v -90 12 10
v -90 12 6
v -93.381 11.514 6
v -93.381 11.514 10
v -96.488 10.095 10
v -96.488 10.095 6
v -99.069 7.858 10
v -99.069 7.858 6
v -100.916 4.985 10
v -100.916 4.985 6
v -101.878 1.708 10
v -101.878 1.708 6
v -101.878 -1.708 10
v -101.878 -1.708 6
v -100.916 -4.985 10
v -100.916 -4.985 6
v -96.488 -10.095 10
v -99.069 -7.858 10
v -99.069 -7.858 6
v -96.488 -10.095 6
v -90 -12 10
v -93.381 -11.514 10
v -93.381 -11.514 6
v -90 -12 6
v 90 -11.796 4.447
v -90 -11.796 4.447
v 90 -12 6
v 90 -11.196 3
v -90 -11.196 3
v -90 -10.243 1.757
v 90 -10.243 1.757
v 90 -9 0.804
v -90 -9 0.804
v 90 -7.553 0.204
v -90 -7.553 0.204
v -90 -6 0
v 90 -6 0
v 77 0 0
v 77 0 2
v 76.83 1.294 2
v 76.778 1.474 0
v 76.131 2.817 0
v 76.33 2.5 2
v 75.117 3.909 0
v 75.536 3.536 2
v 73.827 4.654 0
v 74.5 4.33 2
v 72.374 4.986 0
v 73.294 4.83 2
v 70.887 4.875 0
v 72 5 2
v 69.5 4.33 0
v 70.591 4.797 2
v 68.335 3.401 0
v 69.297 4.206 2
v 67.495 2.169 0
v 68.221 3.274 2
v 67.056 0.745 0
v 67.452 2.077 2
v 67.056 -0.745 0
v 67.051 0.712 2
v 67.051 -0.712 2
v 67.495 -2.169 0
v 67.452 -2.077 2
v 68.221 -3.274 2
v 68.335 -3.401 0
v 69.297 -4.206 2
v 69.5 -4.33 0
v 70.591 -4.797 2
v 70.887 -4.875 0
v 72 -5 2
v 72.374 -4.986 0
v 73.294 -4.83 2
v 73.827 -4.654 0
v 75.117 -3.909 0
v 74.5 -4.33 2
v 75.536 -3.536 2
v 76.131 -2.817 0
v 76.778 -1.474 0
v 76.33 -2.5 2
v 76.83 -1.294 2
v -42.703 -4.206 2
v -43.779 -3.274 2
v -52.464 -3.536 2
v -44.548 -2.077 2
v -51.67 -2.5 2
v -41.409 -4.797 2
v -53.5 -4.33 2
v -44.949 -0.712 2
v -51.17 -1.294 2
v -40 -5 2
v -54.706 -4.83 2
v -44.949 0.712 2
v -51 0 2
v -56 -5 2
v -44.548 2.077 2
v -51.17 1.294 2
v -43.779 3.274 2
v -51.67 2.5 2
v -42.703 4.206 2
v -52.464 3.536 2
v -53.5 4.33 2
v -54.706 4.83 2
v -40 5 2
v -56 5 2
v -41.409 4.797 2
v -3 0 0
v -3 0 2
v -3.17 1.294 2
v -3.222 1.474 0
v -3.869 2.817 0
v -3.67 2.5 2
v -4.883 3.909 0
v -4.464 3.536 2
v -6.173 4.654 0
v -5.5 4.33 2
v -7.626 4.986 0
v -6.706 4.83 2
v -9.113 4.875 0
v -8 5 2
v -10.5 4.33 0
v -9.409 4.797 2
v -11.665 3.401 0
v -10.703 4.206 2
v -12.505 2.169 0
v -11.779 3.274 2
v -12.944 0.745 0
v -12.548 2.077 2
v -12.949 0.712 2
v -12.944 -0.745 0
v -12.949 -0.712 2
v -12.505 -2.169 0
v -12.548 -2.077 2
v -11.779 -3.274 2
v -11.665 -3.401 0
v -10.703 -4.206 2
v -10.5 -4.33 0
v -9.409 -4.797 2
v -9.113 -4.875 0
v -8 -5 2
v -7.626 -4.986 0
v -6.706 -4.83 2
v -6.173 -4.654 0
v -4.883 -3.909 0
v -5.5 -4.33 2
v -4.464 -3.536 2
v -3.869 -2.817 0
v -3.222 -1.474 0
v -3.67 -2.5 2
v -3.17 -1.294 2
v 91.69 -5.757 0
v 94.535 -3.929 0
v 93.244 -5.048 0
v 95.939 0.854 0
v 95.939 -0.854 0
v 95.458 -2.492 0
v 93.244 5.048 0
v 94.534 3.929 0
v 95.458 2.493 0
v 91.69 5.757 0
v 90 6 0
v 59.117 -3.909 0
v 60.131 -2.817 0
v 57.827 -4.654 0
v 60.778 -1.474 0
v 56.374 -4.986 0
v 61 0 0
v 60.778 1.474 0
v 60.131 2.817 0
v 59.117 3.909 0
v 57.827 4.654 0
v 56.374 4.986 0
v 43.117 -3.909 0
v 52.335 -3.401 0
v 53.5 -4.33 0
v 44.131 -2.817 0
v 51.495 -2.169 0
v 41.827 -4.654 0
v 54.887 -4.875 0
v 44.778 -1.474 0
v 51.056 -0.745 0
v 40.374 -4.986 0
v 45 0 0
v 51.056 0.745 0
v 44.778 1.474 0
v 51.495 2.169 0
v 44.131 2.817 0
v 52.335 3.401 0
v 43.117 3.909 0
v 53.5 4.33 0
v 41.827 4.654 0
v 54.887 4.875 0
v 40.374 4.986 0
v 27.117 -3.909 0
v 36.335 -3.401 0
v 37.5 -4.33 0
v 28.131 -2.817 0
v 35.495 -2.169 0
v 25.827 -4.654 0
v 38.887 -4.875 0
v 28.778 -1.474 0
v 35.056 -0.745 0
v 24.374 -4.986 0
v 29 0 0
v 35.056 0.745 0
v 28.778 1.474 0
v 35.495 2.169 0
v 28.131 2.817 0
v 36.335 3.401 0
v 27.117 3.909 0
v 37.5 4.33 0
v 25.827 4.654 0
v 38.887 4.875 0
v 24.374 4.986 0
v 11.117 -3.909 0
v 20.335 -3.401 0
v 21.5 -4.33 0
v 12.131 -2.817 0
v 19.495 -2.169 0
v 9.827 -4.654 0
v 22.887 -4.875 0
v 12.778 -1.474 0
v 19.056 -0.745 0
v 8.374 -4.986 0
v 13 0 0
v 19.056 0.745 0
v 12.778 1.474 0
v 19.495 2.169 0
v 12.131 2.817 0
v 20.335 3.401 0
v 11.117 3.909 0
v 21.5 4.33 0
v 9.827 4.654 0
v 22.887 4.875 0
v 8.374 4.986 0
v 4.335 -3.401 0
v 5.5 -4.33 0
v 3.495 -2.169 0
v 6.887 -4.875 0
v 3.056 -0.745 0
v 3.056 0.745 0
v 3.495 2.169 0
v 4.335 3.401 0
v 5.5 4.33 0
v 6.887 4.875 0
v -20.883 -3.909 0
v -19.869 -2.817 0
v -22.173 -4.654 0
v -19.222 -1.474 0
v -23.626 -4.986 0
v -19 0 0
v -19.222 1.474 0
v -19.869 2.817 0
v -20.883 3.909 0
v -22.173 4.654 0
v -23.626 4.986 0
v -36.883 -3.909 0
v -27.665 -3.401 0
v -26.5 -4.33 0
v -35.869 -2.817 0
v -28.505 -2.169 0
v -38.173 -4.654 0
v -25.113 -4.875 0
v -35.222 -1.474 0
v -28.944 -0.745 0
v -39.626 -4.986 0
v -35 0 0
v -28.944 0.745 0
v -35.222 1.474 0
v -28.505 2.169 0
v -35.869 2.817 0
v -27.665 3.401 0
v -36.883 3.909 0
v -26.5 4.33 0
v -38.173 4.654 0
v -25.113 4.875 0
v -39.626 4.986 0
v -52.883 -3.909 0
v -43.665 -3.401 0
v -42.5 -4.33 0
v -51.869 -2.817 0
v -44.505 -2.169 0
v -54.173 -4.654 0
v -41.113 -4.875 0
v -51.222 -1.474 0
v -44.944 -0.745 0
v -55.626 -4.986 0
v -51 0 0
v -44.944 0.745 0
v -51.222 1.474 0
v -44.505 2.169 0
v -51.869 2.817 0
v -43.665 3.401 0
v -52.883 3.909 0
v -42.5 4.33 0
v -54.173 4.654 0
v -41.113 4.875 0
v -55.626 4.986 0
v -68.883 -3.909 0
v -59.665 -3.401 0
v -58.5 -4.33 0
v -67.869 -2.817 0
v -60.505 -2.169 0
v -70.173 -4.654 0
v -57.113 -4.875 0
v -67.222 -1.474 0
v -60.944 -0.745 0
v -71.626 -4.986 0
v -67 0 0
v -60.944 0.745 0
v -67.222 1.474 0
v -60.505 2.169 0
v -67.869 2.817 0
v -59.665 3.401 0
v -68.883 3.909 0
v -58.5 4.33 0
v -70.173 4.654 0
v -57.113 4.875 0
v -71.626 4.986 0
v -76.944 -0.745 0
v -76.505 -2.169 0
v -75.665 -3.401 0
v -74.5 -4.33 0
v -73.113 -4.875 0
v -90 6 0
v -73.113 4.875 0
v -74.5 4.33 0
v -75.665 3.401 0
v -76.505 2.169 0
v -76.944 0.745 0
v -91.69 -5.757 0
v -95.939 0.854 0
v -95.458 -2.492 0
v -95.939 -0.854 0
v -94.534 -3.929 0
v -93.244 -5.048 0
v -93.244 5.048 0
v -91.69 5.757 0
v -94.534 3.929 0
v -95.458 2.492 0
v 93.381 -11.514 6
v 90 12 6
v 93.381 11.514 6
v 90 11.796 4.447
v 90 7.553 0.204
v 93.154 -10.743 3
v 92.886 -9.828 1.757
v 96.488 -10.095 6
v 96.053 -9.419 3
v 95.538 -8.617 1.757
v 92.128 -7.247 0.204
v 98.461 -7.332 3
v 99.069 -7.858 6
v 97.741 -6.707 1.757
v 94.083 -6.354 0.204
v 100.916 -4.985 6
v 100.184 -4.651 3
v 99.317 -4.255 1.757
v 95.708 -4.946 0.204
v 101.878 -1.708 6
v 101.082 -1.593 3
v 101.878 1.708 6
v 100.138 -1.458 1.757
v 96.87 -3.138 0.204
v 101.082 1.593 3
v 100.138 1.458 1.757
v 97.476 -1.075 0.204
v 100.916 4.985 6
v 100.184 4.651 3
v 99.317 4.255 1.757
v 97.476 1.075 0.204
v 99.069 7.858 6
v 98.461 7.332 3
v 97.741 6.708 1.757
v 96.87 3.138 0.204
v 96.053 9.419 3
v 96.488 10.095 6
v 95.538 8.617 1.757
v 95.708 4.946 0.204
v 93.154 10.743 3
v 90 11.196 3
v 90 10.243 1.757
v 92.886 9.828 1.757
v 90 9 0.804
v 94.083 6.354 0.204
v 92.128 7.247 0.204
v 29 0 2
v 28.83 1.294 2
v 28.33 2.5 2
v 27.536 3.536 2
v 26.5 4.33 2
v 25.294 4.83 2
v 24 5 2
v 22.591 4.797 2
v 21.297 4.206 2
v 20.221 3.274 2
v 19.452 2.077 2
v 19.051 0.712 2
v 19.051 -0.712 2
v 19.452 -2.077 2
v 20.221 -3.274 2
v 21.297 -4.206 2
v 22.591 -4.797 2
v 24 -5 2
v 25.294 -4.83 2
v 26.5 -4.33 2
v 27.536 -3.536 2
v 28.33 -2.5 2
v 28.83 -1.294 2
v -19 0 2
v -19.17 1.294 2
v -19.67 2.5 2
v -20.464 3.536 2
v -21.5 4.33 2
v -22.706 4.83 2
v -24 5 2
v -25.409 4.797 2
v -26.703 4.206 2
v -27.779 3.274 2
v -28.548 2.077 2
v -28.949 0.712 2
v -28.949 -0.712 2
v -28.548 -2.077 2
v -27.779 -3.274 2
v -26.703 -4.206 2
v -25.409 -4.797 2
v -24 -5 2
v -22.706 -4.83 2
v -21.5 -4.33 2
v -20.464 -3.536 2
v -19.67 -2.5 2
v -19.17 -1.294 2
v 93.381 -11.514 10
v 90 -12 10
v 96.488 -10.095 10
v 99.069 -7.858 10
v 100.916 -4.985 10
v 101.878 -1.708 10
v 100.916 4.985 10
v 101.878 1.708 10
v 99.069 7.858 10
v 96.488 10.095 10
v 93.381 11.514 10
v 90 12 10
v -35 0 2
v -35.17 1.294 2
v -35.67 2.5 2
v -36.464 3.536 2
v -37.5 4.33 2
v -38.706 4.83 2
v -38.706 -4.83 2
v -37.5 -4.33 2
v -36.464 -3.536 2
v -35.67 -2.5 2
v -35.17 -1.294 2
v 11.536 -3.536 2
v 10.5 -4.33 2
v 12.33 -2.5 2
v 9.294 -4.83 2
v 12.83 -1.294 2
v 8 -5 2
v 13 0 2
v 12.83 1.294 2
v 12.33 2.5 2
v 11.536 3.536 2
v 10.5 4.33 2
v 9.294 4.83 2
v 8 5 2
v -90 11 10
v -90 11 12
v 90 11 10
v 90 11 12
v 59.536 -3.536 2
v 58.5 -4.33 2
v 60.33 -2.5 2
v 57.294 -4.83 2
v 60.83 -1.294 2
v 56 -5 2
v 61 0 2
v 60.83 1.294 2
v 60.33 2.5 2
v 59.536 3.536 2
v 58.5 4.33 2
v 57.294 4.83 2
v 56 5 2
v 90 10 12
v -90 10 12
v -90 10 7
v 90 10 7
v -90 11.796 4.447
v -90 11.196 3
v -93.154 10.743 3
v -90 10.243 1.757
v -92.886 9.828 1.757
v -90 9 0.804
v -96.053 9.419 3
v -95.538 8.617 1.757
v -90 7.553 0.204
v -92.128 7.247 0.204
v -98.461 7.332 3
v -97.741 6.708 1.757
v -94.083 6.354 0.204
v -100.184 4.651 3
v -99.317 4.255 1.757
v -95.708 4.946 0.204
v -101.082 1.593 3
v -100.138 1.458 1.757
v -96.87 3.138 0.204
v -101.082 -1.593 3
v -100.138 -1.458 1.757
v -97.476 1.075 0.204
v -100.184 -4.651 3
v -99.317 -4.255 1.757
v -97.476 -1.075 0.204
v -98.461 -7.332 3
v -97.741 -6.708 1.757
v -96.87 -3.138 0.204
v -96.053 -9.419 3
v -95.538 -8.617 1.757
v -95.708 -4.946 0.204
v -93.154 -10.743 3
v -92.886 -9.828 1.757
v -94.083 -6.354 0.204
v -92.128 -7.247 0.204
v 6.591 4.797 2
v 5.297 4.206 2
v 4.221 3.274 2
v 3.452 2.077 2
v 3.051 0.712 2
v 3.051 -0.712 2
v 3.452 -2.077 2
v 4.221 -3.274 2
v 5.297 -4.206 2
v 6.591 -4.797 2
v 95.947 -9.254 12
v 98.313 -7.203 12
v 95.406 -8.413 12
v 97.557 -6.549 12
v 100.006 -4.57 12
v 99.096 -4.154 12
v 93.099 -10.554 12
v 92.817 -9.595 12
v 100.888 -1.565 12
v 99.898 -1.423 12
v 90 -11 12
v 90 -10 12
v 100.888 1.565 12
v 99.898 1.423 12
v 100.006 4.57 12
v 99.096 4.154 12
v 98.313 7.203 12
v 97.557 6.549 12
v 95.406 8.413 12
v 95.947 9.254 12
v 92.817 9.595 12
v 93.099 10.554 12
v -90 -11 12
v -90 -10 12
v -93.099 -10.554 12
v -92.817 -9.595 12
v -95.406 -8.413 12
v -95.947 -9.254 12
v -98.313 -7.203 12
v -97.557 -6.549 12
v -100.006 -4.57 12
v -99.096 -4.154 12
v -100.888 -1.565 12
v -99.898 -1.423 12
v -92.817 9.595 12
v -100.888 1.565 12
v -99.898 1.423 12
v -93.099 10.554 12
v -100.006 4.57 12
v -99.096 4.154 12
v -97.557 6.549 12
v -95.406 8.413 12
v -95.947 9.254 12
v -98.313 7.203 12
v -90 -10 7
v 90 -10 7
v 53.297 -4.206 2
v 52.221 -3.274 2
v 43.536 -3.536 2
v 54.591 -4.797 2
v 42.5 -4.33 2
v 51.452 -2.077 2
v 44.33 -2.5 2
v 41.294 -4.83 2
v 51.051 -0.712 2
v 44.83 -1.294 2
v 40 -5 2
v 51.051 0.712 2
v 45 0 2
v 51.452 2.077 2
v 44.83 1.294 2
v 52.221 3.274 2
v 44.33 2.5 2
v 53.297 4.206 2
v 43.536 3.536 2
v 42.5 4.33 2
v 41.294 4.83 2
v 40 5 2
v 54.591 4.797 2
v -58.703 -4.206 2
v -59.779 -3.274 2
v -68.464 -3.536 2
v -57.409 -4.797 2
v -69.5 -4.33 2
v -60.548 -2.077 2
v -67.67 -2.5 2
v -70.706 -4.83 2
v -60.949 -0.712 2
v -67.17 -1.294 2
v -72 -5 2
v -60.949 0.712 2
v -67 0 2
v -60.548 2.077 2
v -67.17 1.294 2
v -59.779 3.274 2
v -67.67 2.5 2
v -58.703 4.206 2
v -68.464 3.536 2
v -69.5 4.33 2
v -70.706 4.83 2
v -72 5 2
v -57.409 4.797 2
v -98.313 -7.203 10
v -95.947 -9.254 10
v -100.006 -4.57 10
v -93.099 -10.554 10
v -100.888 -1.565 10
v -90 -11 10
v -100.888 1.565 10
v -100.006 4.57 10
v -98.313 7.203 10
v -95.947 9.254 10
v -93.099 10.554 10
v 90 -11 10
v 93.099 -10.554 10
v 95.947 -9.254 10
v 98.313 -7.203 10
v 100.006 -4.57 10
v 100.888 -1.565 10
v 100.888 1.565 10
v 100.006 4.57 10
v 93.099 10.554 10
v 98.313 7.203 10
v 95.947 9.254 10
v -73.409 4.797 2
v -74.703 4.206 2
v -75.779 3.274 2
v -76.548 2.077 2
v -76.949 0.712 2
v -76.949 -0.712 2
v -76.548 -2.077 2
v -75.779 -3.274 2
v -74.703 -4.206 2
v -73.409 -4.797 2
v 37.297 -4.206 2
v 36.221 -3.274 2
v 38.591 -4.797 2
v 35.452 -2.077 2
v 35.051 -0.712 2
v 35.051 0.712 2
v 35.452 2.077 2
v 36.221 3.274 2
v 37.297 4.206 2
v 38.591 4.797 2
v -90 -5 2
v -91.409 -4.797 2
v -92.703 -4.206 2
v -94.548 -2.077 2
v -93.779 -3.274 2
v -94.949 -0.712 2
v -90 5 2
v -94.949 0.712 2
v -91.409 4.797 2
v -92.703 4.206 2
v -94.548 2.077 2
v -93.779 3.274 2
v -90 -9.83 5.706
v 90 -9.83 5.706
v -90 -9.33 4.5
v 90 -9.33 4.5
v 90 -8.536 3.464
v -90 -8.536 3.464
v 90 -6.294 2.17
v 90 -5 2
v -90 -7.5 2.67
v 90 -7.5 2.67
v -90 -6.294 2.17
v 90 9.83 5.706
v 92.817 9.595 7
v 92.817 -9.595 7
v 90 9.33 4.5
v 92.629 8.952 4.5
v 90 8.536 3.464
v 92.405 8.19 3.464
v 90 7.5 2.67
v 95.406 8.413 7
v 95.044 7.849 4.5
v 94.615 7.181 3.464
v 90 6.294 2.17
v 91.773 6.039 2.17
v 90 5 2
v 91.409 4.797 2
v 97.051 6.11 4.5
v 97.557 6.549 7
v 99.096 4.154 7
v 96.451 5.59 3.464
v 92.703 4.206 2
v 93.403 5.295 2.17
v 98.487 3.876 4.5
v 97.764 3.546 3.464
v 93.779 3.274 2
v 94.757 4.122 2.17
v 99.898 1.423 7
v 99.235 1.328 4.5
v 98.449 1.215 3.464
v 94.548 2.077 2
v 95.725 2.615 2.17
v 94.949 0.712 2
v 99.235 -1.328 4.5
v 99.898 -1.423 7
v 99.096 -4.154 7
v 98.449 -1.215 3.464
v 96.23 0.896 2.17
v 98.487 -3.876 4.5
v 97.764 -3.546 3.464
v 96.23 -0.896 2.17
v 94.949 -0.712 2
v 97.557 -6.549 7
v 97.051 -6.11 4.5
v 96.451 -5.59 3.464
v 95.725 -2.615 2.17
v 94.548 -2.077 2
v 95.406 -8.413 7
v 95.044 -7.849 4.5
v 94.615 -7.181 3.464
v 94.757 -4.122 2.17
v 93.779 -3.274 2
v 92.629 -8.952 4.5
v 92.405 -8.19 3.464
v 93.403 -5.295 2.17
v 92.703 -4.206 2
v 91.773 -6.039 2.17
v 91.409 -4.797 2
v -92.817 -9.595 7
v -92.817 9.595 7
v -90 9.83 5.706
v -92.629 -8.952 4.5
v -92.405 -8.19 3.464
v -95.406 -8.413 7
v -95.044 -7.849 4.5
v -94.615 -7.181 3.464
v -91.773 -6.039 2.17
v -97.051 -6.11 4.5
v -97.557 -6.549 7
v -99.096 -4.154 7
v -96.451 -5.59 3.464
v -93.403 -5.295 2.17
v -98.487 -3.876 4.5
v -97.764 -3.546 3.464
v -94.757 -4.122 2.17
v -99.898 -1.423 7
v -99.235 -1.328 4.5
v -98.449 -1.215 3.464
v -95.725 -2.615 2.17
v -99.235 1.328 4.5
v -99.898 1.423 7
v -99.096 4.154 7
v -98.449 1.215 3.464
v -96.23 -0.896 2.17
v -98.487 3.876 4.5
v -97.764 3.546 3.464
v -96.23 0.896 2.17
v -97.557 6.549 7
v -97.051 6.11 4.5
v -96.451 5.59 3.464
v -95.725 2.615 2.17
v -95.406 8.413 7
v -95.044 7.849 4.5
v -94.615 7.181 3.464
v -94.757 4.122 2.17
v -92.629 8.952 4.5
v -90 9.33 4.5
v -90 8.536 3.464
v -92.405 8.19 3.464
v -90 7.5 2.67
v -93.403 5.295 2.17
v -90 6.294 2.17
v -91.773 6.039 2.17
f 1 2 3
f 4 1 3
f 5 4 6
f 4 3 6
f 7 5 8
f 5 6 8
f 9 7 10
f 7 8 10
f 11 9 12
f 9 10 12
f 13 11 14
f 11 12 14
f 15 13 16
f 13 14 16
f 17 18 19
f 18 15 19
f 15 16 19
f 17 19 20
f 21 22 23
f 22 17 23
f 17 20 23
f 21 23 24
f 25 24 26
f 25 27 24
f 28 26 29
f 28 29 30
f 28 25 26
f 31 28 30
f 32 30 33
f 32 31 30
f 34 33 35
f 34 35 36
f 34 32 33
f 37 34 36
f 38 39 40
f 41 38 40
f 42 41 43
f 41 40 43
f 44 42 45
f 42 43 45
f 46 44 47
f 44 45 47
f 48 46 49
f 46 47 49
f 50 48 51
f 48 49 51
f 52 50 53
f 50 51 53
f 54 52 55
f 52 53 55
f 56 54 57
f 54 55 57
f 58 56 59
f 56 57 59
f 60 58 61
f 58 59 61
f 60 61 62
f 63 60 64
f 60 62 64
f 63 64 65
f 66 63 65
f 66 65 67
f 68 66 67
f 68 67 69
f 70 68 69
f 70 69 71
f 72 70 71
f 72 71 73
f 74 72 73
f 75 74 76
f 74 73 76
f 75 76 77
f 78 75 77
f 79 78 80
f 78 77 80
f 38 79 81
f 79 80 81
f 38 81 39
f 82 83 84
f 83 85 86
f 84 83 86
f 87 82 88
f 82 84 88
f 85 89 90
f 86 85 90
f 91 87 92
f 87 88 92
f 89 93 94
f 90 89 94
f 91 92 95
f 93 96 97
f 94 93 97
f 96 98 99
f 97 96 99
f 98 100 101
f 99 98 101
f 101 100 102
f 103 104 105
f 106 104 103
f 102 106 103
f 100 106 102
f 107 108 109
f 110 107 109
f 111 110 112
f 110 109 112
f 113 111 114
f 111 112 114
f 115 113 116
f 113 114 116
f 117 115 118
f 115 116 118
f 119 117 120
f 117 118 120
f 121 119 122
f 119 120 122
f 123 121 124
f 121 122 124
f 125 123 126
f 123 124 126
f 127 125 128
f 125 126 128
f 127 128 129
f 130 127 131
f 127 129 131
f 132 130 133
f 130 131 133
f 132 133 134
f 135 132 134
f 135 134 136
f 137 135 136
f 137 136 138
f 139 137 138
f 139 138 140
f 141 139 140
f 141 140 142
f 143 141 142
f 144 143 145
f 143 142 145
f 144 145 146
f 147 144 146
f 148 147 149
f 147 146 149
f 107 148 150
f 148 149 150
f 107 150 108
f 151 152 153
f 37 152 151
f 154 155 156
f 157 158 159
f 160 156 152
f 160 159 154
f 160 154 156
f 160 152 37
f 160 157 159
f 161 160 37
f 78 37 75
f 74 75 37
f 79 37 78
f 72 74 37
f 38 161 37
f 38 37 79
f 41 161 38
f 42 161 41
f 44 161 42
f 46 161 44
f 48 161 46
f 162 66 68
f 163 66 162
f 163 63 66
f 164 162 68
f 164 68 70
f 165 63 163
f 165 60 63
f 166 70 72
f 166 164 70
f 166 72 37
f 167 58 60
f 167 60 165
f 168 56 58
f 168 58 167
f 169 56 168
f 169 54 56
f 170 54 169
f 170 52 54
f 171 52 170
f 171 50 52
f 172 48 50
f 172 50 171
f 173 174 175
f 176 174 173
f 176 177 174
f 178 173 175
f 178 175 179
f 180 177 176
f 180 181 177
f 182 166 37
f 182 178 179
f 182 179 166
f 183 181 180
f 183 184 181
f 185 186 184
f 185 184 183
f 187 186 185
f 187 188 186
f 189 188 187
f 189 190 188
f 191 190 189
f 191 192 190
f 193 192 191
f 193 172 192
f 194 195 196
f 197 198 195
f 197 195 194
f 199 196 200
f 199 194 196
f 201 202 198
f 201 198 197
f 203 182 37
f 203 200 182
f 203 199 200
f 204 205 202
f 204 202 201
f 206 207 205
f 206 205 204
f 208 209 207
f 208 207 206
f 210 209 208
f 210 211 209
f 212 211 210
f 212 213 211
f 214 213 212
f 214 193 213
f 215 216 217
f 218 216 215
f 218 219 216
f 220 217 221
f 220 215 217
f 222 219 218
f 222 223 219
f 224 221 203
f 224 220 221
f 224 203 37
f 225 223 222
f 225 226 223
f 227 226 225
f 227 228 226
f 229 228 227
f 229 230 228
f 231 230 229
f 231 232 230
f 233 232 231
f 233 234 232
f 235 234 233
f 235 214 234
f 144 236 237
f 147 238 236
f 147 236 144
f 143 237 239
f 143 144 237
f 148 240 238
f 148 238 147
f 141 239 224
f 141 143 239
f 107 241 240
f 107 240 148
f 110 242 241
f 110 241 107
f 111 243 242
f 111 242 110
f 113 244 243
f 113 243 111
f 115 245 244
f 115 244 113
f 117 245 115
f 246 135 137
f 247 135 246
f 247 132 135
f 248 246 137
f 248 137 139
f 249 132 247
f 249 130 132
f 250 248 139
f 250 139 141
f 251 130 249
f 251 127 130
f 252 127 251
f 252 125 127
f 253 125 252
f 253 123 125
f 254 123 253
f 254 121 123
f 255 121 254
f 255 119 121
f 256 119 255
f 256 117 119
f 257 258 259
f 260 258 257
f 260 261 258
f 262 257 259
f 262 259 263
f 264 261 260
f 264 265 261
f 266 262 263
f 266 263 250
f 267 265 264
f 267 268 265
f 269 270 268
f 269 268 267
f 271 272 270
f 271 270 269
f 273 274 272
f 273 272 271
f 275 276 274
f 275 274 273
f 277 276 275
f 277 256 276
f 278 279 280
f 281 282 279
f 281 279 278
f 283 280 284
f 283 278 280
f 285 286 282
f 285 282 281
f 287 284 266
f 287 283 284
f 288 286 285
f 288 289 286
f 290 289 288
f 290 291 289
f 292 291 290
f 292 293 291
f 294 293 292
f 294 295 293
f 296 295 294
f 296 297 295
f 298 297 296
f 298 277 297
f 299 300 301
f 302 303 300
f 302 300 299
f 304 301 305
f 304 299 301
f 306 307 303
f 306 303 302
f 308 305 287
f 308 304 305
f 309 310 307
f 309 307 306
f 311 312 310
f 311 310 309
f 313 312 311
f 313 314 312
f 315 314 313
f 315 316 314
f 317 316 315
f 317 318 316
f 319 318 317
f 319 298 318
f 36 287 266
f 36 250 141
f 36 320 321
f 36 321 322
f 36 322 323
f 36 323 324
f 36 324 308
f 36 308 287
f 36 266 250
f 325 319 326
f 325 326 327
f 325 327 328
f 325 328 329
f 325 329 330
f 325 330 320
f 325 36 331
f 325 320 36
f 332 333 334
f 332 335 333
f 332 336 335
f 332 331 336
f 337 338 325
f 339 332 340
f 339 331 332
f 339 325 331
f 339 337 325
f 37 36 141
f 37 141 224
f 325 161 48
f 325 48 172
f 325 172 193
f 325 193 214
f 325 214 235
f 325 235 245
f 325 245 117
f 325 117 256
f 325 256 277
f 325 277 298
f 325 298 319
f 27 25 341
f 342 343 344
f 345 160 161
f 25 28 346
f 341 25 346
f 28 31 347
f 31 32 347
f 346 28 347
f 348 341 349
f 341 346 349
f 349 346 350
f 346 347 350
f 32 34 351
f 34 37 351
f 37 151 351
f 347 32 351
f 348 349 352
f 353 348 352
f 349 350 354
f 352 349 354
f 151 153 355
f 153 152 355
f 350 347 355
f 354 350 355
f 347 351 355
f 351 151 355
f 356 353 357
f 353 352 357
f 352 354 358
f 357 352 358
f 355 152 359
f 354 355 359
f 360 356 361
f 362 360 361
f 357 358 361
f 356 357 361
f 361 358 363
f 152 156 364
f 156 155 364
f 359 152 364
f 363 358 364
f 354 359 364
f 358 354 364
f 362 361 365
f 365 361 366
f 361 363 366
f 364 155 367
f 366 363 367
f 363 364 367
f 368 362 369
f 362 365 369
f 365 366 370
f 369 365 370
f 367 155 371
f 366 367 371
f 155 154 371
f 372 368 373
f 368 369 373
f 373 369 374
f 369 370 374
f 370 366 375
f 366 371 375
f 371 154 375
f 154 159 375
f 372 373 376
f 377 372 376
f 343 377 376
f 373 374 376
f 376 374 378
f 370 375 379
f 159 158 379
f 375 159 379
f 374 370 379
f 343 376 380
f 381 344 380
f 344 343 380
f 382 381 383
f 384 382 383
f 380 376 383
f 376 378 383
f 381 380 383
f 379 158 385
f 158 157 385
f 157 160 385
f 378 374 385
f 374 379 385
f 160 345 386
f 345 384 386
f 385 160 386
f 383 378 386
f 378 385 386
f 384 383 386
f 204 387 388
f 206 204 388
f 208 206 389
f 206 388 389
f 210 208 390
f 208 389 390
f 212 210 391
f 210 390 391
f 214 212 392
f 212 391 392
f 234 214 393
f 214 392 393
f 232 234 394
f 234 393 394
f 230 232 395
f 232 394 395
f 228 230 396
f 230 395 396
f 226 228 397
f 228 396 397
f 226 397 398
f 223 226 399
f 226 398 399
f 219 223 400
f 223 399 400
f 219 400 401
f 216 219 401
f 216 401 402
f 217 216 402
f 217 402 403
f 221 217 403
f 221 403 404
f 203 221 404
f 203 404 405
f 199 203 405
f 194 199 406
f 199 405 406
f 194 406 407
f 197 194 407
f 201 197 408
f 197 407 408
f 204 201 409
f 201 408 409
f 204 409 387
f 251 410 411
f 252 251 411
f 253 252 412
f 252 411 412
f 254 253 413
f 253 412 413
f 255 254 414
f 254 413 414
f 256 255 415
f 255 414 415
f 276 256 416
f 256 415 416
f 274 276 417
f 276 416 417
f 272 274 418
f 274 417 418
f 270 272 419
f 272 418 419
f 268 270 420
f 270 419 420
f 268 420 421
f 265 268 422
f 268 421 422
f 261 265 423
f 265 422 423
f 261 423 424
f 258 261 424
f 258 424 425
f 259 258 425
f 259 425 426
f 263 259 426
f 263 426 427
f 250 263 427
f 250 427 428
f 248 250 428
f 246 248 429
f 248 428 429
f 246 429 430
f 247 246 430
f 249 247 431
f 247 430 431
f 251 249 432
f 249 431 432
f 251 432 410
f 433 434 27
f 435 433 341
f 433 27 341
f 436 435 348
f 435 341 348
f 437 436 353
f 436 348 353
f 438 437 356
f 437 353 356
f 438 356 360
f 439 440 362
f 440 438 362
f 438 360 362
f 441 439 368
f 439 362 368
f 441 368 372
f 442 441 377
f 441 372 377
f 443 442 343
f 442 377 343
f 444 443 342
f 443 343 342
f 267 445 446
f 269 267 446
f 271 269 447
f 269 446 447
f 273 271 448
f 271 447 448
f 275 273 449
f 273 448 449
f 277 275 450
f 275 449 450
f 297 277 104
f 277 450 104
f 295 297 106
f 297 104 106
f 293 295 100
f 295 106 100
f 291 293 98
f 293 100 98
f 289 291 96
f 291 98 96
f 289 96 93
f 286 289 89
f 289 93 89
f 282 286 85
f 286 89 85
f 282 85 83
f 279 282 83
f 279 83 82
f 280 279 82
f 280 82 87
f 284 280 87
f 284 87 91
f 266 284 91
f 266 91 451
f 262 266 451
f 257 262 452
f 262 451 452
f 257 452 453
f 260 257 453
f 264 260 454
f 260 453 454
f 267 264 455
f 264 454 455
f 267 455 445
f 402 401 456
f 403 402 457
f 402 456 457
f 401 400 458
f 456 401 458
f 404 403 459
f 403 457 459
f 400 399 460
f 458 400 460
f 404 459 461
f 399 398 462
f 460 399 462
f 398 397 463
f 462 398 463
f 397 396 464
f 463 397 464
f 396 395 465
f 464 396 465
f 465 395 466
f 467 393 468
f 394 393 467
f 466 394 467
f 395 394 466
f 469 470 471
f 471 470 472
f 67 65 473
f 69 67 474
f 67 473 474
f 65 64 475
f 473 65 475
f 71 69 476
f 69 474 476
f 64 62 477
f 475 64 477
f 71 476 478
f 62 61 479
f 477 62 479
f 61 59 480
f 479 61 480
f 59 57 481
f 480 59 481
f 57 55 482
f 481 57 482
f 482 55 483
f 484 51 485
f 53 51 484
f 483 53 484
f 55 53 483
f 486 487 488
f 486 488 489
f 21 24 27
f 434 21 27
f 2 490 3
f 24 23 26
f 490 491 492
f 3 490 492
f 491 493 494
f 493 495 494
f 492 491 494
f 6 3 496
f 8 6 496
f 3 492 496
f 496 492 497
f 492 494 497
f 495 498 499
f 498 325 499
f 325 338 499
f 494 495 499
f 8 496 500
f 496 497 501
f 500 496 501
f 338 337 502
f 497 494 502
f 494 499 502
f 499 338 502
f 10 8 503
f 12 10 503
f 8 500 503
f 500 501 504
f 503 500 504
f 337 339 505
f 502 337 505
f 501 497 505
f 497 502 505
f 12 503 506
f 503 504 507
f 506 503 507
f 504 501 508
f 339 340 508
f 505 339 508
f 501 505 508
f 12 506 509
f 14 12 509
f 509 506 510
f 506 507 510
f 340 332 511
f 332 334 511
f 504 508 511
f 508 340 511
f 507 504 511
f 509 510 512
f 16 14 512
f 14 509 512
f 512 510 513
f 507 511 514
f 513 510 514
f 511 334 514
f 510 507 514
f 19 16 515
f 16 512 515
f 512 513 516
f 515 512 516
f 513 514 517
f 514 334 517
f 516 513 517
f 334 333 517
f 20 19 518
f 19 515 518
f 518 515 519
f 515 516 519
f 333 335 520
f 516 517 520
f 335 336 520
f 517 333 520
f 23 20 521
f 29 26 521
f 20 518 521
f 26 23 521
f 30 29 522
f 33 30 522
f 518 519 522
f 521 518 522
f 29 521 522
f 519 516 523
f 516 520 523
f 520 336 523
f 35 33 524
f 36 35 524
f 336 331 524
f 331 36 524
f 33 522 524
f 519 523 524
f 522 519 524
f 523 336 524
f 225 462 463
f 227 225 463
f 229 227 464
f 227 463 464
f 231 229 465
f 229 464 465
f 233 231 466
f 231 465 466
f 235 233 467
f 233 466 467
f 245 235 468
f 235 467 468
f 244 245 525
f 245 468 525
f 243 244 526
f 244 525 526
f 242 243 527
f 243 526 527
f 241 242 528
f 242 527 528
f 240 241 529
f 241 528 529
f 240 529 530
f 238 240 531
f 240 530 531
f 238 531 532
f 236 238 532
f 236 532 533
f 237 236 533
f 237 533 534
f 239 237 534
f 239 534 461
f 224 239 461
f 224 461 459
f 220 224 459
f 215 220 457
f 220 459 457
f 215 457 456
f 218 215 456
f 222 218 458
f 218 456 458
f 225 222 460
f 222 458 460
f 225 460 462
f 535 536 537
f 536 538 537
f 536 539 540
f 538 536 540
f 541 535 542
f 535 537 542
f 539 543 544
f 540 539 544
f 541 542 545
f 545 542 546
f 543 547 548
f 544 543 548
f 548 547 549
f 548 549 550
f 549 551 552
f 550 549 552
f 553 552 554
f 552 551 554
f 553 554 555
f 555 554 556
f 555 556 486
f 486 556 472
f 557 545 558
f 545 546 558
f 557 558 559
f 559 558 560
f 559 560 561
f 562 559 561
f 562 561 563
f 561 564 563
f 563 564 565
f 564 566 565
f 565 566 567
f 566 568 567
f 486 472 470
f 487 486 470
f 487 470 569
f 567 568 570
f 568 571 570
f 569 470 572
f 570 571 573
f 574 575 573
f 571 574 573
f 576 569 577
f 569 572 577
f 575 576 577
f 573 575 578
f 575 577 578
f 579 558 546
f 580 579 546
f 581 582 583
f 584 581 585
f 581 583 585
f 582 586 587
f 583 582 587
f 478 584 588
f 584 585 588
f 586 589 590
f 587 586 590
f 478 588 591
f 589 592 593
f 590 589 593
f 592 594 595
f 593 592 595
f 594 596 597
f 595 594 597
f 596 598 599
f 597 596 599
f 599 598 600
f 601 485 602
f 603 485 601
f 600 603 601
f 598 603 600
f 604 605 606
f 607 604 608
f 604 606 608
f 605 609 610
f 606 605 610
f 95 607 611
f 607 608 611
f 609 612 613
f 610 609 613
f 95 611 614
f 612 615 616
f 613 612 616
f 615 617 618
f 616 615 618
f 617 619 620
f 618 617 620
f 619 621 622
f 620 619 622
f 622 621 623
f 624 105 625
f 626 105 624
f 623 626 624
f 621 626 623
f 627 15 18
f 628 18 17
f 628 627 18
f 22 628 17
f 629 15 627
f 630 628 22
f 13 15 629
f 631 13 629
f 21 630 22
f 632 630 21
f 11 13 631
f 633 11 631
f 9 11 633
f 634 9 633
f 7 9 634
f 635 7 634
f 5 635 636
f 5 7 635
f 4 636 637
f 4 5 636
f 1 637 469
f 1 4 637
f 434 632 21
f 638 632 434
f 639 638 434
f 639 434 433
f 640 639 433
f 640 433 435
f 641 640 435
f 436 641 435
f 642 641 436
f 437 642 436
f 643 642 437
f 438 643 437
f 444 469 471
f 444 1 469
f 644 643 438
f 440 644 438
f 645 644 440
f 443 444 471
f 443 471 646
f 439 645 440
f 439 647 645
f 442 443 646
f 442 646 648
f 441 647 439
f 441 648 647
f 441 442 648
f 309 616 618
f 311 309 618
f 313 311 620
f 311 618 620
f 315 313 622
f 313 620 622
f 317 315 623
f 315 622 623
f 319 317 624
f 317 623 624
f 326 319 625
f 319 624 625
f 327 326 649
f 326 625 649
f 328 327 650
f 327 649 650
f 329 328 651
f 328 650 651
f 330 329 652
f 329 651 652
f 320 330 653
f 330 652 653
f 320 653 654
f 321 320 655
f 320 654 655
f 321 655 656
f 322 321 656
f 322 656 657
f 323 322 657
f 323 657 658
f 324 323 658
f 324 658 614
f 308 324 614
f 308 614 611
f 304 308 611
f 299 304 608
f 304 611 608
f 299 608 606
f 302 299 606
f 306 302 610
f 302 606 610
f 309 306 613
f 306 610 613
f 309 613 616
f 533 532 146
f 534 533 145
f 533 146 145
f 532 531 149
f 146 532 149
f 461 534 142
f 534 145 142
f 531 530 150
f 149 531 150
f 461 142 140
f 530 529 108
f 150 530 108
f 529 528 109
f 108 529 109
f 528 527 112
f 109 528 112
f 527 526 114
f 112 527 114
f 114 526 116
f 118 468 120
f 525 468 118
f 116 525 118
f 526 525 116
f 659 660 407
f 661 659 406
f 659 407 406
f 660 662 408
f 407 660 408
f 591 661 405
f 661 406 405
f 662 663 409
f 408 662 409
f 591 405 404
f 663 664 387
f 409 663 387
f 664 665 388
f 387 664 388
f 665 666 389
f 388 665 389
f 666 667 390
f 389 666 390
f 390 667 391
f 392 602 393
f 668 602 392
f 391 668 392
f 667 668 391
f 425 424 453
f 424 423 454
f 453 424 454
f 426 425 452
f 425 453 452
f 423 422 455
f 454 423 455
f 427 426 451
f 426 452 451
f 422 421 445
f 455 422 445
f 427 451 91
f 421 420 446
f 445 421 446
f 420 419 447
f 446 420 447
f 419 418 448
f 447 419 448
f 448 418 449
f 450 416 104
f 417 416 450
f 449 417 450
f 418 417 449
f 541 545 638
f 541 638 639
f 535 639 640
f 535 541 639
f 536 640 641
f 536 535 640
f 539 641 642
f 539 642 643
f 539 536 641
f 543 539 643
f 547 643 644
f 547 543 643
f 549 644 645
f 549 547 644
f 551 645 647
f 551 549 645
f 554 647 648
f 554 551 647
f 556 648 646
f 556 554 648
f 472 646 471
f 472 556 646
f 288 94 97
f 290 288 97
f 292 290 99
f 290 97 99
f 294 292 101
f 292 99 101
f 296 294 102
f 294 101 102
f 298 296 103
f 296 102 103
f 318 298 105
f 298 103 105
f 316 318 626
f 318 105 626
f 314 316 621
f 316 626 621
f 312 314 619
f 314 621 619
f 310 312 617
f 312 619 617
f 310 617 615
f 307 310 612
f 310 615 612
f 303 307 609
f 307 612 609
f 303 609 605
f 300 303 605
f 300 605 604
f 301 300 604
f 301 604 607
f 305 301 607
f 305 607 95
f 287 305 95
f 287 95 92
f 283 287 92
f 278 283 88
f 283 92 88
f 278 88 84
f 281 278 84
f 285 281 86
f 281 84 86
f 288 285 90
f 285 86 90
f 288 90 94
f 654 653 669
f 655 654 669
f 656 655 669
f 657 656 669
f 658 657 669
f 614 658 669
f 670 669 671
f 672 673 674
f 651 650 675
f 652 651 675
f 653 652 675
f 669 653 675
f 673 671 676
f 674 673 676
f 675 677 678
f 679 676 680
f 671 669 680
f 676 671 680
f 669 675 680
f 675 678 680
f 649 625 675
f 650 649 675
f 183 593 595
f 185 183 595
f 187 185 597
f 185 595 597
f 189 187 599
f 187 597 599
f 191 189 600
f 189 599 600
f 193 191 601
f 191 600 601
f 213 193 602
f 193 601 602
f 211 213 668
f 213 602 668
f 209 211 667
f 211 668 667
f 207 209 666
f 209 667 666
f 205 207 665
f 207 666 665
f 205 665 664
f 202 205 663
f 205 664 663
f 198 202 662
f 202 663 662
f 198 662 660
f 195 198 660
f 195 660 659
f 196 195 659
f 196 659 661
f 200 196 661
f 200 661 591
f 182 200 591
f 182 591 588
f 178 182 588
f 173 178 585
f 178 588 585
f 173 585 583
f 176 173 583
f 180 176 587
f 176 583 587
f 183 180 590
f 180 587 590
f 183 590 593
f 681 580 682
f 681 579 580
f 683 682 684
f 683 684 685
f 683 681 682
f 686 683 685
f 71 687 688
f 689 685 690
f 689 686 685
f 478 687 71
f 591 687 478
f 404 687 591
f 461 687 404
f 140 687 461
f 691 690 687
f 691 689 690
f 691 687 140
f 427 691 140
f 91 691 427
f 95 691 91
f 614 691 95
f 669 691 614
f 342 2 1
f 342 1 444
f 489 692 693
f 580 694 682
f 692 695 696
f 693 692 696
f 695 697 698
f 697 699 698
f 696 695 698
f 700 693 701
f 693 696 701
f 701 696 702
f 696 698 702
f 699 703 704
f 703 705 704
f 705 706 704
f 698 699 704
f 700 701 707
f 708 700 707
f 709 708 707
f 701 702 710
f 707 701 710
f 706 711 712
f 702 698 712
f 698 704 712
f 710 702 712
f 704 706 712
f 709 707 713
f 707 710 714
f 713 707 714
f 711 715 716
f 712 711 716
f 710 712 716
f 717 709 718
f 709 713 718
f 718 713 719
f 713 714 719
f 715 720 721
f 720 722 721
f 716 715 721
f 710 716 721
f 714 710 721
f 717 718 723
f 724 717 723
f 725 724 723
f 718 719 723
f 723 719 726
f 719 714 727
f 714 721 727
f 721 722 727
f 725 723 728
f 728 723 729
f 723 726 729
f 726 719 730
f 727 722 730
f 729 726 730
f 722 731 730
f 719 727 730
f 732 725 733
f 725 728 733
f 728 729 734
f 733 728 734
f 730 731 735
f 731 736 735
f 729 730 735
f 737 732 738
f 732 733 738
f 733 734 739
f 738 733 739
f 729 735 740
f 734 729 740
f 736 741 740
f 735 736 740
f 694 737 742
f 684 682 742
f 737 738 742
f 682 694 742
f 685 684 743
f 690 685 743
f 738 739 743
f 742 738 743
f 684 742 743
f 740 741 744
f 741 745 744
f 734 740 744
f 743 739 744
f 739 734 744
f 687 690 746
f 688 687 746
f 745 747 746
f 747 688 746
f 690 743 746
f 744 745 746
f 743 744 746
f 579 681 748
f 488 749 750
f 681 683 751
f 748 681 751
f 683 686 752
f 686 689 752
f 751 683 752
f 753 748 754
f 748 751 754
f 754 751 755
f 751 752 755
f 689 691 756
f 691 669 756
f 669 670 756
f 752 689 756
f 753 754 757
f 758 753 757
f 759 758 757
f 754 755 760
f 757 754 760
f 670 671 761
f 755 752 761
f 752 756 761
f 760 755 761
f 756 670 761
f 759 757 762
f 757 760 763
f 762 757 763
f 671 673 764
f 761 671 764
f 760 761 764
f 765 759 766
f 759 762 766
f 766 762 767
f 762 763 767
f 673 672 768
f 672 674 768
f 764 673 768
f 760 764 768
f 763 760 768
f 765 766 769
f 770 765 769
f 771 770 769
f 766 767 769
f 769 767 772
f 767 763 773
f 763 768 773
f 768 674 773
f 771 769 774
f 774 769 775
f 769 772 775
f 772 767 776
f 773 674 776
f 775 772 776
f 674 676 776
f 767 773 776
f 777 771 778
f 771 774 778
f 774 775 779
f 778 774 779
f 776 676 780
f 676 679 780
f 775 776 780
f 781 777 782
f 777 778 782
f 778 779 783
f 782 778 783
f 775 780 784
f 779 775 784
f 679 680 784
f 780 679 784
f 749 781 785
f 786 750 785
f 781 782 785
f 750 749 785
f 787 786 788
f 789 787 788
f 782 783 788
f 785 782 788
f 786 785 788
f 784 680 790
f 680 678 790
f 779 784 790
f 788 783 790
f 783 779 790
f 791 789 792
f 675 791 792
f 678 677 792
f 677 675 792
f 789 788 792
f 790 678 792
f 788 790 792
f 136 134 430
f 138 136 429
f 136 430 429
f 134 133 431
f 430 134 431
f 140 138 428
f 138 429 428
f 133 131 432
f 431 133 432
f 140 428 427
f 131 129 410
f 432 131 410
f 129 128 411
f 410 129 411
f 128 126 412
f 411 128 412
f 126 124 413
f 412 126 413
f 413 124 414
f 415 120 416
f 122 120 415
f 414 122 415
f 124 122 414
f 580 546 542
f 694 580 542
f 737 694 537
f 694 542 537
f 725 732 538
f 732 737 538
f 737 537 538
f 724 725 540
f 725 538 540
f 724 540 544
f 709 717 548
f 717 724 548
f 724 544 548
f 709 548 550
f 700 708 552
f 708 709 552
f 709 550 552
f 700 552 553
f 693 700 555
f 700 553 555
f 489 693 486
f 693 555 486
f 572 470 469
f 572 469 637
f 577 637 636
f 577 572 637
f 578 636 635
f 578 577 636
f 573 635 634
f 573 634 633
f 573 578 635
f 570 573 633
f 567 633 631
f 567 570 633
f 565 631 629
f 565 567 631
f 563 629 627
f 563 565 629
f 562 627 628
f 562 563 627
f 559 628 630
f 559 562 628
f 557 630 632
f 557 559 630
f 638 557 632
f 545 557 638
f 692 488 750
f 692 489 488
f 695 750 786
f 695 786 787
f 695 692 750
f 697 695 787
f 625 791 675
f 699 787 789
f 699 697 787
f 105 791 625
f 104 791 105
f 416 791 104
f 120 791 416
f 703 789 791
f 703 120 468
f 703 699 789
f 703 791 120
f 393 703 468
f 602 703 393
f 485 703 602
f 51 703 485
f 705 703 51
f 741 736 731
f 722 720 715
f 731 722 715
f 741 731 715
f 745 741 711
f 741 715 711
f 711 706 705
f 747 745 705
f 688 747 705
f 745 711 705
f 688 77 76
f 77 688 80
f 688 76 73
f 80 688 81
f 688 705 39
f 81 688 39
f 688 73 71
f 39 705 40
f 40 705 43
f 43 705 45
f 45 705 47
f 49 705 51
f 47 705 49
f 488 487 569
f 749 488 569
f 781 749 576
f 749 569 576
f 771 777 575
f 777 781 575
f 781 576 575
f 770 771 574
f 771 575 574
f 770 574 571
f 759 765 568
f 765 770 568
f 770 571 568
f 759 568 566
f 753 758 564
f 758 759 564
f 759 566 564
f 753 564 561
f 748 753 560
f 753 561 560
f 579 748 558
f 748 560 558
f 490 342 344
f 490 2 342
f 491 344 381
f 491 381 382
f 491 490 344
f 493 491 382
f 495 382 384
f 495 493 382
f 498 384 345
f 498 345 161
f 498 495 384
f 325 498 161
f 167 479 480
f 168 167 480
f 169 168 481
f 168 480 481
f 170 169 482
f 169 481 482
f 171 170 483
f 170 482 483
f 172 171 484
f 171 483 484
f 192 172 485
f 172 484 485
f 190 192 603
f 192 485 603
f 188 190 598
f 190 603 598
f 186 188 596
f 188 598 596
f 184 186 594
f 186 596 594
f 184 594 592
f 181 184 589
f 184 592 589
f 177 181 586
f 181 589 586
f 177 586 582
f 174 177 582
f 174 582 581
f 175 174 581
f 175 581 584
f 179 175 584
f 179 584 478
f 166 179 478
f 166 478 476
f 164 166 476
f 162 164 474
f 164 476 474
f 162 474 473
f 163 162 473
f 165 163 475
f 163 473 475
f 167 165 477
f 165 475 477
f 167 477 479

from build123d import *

# Parameters (mm, degrees)
PAD_DEPTH       = 12
POCKET_DEPTH    = 10
FILLET_R        = 5
FILLET001_R     = 6
SKETCH002_W     = 211.472893
SKETCH002_H     = 45.806395
POCKET001_DEPTH = 2
SKETCH003_R     = 5
POCKET002_DEPTH = 2.001


with BuildPart() as part:
    # Sketch → Pad (new body)
    with BuildSketch(Plane.XY):
        with BuildLine():
            Line((-90, 12), (89.999964, 12))
            ThreePointArc((90, -12), (102, 1.8e-05), (89.999964, 12))
            Line((-90, -12), (90, -12))
            ThreePointArc((-90, 12), (-102, 0), (-90, -12))
        make_face()
    extrude(amount=PAD_DEPTH)

    # Sketch001 (on Face6 of Pad) → Pocket (cut)
    with BuildSketch(Plane.XY.offset(12)):
        with BuildLine():
            Line((-90, 10), (90, 10))
            ThreePointArc((90, -10), (100, 0), (90, 10))
            Line((-90, -10), (90, -10))
            ThreePointArc((-90, 10), (-100, 0), (-90, -10))
        make_face()
    extrude(amount=-POCKET_DEPTH, mode=Mode.SUBTRACT)

    # Fillet
    fillet_edges = [part.edges().sort_by_distance(p)[0] for p in [
        (0, 10, 2),
    ]]
    fillet(fillet_edges, radius=FILLET_R)

    # Fillet001
    fillet001_edges = [part.edges().sort_by_distance(p)[0] for p in [
        (0, -12, 0),
    ]]
    fillet(fillet001_edges, radius=FILLET001_R)

    # Sketch002 (on Face4 of Fillet001) → Pocket001 (cut)
    with BuildSketch(Plane.XY.offset(12)):
        with Locations((-0.18729, 1.421787)):
            Rectangle(SKETCH002_W, SKETCH002_H)
        with BuildLine():
            Line((-90, 11), (90, 11))
            ThreePointArc((90, -11), (101, 0), (90, 11))
            Line((-90, -11), (90, -11))
            ThreePointArc((-90, 11), (-101, 0), (-90, -11))
        make_face(mode=Mode.SUBTRACT)
    extrude(amount=-POCKET001_DEPTH, mode=Mode.SUBTRACT)

    # Sketch003 (on Face24 of Pocket001) → Pocket002 (cut, through all)
    with BuildSketch(Plane.XY.offset(2)):
        with Locations((-8, 0)):
            Circle(SKETCH003_R)
        with Locations((-24, 0)):
            Circle(SKETCH003_R)
        with Locations((-40, 0)):
            Circle(SKETCH003_R)
        with Locations((-56, 0)):
            Circle(SKETCH003_R)
        with Locations((-72, 0)):
            Circle(SKETCH003_R)
        with Locations((8, 0)):
            Circle(SKETCH003_R)
        with Locations((24, 0)):
            Circle(SKETCH003_R)
        with Locations((40, 0)):
            Circle(SKETCH003_R)
        with Locations((56, 0)):
            Circle(SKETCH003_R)
        with Locations((72, 0)):
            Circle(SKETCH003_R)
    extrude(amount=-POCKET002_DEPTH, mode=Mode.SUBTRACT)


solid = part.part
